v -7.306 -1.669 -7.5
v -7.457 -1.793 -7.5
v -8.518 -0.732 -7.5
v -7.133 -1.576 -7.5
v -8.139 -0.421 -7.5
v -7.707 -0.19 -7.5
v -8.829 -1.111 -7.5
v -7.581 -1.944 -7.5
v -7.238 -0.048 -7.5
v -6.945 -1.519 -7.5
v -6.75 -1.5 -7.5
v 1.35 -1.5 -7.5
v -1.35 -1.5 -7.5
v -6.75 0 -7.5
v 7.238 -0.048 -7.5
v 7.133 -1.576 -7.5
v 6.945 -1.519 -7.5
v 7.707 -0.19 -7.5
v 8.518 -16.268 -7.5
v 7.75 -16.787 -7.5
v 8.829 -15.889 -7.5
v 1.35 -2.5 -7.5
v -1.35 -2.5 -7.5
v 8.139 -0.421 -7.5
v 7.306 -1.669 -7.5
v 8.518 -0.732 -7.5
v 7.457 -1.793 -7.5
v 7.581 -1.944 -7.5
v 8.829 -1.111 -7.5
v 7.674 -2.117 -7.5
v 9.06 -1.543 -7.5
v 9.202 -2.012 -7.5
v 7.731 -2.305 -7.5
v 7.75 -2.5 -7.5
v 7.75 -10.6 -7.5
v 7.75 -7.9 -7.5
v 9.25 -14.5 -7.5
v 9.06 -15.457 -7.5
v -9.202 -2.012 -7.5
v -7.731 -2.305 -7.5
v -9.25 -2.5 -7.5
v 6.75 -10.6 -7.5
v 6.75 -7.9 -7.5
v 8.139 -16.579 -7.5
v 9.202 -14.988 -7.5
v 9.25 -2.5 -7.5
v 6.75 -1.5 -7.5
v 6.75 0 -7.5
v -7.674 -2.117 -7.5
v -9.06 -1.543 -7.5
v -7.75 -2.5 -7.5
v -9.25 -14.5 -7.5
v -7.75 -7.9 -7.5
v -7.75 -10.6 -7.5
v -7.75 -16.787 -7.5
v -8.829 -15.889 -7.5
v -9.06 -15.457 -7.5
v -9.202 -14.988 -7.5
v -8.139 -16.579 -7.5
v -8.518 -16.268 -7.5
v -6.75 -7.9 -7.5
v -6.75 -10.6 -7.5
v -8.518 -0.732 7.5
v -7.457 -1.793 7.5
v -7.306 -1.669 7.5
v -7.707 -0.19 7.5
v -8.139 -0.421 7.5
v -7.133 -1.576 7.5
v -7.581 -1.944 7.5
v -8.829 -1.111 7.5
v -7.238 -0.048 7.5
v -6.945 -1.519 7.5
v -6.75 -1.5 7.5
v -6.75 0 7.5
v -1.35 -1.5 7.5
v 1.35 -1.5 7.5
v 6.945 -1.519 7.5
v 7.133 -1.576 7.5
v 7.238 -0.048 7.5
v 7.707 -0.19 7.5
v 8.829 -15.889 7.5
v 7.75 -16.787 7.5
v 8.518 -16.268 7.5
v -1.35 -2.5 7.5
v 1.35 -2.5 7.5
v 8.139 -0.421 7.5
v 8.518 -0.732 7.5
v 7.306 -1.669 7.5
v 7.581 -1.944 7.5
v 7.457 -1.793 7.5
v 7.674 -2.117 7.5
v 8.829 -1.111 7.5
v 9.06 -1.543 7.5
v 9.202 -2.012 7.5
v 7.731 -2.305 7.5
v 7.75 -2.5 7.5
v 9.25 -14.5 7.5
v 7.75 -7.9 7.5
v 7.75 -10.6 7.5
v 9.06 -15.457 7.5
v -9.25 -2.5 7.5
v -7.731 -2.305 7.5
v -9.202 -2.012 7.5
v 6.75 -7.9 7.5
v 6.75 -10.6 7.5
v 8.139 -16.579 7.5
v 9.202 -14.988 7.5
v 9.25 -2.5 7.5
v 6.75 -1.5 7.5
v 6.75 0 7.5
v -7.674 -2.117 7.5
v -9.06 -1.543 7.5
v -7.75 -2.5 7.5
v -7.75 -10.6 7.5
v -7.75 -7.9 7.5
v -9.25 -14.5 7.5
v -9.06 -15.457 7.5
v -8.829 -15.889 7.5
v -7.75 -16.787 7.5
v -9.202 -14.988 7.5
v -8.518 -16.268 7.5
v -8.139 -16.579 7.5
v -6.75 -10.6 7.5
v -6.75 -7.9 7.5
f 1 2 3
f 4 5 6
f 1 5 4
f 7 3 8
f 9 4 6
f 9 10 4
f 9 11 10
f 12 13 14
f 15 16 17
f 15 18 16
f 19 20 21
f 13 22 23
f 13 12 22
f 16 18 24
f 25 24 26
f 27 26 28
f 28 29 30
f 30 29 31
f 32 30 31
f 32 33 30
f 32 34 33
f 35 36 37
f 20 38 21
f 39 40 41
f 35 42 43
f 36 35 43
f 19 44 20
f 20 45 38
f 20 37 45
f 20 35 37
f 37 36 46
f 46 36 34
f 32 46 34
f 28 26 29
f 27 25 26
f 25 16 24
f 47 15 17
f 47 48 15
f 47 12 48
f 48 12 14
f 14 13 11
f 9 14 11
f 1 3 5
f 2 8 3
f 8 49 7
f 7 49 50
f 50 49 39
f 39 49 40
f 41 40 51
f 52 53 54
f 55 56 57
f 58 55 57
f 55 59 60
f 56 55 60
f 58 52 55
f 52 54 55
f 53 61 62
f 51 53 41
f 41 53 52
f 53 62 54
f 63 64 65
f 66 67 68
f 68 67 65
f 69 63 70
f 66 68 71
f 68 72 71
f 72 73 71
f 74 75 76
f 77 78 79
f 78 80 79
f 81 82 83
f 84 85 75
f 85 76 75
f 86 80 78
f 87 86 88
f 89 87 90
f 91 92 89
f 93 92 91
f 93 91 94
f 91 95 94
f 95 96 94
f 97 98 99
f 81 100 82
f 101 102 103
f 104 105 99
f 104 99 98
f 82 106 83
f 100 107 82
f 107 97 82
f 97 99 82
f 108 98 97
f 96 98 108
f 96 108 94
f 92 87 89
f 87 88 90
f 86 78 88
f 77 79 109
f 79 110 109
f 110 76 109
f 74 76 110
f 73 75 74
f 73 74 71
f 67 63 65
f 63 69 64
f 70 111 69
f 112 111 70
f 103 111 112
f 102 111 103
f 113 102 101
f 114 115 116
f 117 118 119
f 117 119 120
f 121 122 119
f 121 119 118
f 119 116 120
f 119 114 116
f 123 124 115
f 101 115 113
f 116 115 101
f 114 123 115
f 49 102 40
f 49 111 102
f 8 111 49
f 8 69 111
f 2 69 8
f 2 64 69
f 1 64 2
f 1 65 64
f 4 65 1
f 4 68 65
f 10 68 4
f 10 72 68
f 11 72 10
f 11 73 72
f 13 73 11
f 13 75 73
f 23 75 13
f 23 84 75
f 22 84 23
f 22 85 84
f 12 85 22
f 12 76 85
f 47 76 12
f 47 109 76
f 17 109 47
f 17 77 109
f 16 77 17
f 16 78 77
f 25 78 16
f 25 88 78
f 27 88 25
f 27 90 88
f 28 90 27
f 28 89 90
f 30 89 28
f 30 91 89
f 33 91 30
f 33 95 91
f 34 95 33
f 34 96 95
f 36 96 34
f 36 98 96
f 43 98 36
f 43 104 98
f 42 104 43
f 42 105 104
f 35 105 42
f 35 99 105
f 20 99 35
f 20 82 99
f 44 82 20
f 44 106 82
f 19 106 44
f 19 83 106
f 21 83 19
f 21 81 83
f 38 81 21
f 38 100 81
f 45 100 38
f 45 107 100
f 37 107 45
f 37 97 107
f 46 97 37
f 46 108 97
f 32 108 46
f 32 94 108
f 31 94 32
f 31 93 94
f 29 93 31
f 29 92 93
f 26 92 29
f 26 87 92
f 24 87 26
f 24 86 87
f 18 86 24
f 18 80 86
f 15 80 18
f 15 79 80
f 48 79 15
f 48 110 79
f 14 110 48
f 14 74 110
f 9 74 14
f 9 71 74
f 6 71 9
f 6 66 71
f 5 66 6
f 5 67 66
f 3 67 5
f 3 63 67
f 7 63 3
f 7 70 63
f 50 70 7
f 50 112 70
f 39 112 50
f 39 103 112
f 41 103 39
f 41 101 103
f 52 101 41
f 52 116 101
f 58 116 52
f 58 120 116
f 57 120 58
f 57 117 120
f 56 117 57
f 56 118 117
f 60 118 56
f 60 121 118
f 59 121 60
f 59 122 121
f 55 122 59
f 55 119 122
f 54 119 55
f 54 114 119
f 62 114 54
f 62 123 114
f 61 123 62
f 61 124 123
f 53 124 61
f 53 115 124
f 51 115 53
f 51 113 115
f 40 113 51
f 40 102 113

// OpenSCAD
$fn = 32;

module rounded_rectangle(width = 1, height = 1, rounding = 0) {
	if (rounding > 0) {
		non_rounded_width = width - 2*rounding;
		non_rounded_height = height - 2*rounding;

		// correct for funky minkowski displacement
		translate([-non_rounded_width/2, -non_rounded_height/2])
			minkowski() {
				square([non_rounded_width, non_rounded_height], center = true);
				translate([non_rounded_width/2, non_rounded_height/2, 0])
					circle(rounding, center = true);
			}
	} else {
		// minkowski doesn't work properly on circle with diameter 0
		square([width, height], center = true);
	}
}

function openbeam_clip_outer_width(beam_width, thickness) =
	beam_width + 2*thickness;

module openbeam_clip_cross(beam_width, rounding, thickness) {
	difference() {
		outer_width = openbeam_clip_outer_width(beam_width = beam_width,
			thickness = thickness);

		// since clip is open at the bottom, remove one thickness and
		// move down by half of that to be back in center
		translate([0, thickness/2, 0])
			rounded_rectangle(width = outer_width,
				height = outer_width - thickness,
				rounding = rounding + thickness);

		// make inner rectangle higher than outer by one thickness
		// (to be on the safe side) and shift down by
		// half of that to be centered with the outer again
		translate([0, -thickness/2, 0])
			rounded_rectangle(width = beam_width,
				height = beam_width + thickness,
				rounding = rounding);
	}
}

module openbeam_clip_stay(slot_width = 3.2, protrusion = 0.75) {
	square([slot_width, protrusion], center = true);
}

module openbeam_clip(beam_width = 15, height = 15,
		beam_slot_width = 3.2, stay_protrusion = 1,
		rounding = 1, thickness = 1.5,
		epsilon = 0.25) {
	cbw = beam_width + 2*epsilon;
	outer_width = openbeam_clip_outer_width(beam_width = cbw, thickness = thickness);

	// move back into center after extrude but put top onto y as base-line
	// for attaching things to it
	translate([0, -outer_width/2, -height/2])
		linear_extrude(height)
			union() {
				openbeam_clip_cross(beam_width = cbw,
					rounding = rounding,
					thickness = thickness);

				// add in the stays
				stay_position = cbw/2 - stay_protrusion/2;
				cbsw = beam_slot_width - 2*epsilon;
				for (stay_angle =[-90:90:90])
					rotate([0, 0, stay_angle])
						translate([0, stay_position, 0])
						openbeam_clip_stay(slot_width = cbsw,
							protrusion = stay_protrusion);
			}
}

openbeam_clip();
